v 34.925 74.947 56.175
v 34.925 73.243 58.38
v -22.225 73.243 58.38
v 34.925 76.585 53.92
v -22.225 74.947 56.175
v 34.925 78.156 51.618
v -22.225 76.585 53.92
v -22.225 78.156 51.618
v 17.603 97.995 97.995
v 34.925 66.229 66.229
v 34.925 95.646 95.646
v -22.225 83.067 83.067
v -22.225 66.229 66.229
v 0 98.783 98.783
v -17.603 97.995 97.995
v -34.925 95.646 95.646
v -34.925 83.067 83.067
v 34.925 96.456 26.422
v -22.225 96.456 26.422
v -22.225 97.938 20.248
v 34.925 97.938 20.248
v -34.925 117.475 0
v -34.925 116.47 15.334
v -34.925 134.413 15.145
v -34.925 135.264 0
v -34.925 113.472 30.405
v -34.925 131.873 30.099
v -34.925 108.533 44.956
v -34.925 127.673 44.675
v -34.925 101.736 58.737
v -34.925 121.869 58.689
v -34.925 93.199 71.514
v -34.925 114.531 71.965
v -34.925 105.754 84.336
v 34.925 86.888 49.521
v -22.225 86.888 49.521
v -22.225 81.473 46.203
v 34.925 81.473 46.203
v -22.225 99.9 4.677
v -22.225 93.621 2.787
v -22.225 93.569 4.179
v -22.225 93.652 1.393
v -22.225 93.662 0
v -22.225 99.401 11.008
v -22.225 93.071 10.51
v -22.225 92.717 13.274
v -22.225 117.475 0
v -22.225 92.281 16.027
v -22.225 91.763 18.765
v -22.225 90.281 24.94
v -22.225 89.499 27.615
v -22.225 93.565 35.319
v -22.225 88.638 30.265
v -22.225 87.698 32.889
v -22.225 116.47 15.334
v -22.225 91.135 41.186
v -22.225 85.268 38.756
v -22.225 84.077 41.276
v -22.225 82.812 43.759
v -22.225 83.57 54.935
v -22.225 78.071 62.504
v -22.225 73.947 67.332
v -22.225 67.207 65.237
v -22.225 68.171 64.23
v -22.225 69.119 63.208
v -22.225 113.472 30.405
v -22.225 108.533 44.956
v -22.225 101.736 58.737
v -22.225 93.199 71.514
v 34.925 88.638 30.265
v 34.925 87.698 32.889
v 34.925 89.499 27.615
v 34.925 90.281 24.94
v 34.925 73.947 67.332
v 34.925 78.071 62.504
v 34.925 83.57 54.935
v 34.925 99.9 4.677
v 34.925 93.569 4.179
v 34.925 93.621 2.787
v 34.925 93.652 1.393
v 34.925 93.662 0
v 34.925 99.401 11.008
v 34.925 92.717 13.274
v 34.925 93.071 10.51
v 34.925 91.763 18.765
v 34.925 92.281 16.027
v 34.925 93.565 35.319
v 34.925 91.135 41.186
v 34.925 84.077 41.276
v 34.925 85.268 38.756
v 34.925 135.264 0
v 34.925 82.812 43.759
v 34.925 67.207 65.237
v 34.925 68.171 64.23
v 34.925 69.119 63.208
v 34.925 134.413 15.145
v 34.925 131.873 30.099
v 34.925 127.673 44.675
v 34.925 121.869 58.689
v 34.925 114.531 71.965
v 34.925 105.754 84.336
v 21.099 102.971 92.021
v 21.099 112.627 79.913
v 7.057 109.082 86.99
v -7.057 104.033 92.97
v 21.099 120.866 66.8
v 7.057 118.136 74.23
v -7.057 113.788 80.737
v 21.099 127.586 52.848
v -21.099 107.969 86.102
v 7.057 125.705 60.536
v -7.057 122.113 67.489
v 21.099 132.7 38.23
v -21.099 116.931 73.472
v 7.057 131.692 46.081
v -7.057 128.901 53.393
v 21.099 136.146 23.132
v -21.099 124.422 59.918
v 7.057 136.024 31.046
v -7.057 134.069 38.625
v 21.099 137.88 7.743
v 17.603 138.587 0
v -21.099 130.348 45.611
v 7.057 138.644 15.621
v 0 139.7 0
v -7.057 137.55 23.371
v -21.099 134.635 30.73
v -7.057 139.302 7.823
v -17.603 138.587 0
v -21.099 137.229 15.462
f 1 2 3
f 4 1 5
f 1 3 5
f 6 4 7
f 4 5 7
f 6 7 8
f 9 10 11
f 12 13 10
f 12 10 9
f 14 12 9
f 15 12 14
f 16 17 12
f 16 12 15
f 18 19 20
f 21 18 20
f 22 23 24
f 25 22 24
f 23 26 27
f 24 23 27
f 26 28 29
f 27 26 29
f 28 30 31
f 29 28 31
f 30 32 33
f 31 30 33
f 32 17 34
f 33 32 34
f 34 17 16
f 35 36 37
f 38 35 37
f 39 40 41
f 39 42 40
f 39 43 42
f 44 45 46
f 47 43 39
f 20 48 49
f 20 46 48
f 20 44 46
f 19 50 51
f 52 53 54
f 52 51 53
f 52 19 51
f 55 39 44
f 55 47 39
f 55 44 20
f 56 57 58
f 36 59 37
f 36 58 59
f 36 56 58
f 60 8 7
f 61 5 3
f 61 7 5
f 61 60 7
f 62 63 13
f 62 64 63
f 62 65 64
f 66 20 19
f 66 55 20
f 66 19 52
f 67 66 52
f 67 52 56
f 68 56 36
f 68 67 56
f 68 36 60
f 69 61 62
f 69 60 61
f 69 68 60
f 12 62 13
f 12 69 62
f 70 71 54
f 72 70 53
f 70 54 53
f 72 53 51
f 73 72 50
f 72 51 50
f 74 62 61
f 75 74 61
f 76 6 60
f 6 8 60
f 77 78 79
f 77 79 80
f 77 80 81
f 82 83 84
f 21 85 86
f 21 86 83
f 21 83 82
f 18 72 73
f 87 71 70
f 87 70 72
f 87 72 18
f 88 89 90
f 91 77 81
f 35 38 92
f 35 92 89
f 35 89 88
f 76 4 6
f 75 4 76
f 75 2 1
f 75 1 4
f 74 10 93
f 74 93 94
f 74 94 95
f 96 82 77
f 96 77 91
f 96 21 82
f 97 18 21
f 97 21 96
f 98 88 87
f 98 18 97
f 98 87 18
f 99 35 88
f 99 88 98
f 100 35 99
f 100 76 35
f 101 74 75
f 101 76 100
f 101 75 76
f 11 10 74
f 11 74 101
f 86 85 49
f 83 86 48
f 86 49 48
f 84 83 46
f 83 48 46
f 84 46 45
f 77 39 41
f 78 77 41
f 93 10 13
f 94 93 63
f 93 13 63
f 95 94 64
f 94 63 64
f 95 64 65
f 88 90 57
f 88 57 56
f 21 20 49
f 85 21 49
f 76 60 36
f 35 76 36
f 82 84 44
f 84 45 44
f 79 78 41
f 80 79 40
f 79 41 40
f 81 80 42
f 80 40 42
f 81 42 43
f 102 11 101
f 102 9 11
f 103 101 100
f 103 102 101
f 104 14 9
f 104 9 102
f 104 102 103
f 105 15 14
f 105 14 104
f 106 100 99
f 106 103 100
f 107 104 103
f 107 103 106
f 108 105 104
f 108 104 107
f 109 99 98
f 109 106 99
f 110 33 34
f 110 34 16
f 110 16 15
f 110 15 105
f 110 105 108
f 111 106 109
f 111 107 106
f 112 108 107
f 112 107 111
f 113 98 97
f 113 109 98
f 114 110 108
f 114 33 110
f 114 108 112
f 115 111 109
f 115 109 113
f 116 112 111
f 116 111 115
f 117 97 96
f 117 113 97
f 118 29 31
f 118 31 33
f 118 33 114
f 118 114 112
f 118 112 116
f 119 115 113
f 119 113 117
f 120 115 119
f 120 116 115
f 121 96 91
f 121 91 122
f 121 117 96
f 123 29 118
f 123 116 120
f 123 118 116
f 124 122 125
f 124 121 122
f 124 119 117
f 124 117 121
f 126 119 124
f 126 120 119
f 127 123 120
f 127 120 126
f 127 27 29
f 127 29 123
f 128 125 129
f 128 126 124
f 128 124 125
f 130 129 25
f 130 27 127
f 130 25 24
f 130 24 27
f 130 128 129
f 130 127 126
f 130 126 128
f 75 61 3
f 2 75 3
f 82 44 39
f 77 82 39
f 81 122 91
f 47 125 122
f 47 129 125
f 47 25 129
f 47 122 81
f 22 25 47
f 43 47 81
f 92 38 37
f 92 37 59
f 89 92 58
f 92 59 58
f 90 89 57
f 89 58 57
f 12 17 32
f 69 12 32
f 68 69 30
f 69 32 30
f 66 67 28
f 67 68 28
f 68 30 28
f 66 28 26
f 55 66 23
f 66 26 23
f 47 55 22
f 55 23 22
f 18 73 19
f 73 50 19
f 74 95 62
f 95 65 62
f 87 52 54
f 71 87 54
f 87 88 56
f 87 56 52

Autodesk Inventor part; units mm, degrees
ref_plane "YZ Plane" through (0, 0, 0) normal (1, 0, 0) x (0, 1, 0)
ref_plane "XZ Plane" through (0, 0, 0) normal (0, 1, 0) x (-1, 0, 0)
sketch "Sketch1" plane through (0, 0, 0) normal (0, 0, 1) x (1, 0, 0)
  circle A0 centre (0, 0) radius 139.7
  line L0 (0, 139.7) -> (234.2216, 139.7) construction
  line L1 (-34.925, 185.7375) -> (34.925, 185.7375) construction
  line L2 (34.925, 185.7375) -> (34.925, 93.6625)
  line L3 (34.925, 93.6625) -> (-34.925, 93.6625)
  line L4 (-34.925, 93.6625) -> (-34.925, 185.7375)
  line L5 (-34.925, 185.7375) -> (34.925, 93.6625) construction
  line L6 (34.925, 185.7375) -> (-34.925, 93.6625) construction
  line L7 (0, 0) -> (253.8576, 0) construction
  point P0 (-34.925, 135.2639)
  point P1 (34.925, 135.2639)
  dimension "d6" = 279.4
  dimension "d7" = 69.85
  dimension "d8" = 92.075
  dimension "d9" = 93.6625
revolve "Revolution2" add sketch "Sketch1" angle 360 about axis through (0, 0, 0) along (1, 0, 0) picked at (2.3523, 108.9489) contours L2 L3 L4 A0
sketch "Sketch4" plane through (-34.925, 0, 0) normal (-1, 0, 0) x (0, 0, 1)
  circle A0 centre (0, 0) radius 93.6625 projected
  circle A1 centre (0, 0) radius 117.475
  dimension "d24" = 234.95
extrude "Extrusion3" cut sketch "Sketch4" against normal blind 12.7
sketch "Sketch5" plane through (34.925, 0, 0) normal (1, 0, 0) x (0, 0, -1)
  circle A0 centre (0, 0) radius 93.6625 projected
  circle A1 centre (0, 0) radius 135.2639 projected
  line L0 (0, 0) -> (0, 180.6754)
  line L1 (0, 0) -> (-127.7568, 127.7568)
  line L2 (0, 0) -> (-180.6754, 0)
  line L3 (0, 0) -> (-127.7568, -127.7568)
  line L4 (0, 0) -> (0, -180.6754)
  line L5 (0, 0) -> (127.7568, -127.7568)
  line L6 (0, 0) -> (180.6754, 0)
  line L7 (0, 0) -> (127.7568, 127.7568)
  dimension "d29" = 360
ref_plane "Work Plane1" through (34.925, 0, 0) normal (0, 0, 1) x (0, 1, 0)
pattern_circular "Circular Pattern1" count 8 over 360 about axis through (0, 0, 0) along (1, 0, 0)
split "Split1" plane through (34.925, 0, 0) removes the side toward (0, 0, -1)
split "Split2" plane through (34.925, 0, 0) removes the side toward (0, -0.7071068, 0.7071068)
sketch "Sketch6" plane through (-22.225, 0, 0) normal (-1, 0, 0) x (0, 0, 1)
  arc A0 (66.2294, 66.2294) -> (0, 93.6625) centre (0, 0) ccw projected
  line L0 (0, 0) -> (75.2096, 181.5721) construction
  line L1 (0, 0) -> (196.5323, 0) construction
  line L2 (32.8892, 87.6982) -> (38.7558, 85.2681)
  line L3 (38.7558, 85.2681) -> (41.1858, 91.1348)
  line L4 (41.1858, 91.1348) -> (35.3192, 93.5648)
  line L5 (35.3192, 93.5648) -> (32.8892, 87.6982)
  line L6 (38.2525, 92.3498) -> (35.8225, 86.4831)
  dimension "d37" = 67.5
  dimension "d46" = 6.35
  dimension "d48" = 6.35
extrude "Extrusion4" cut sketch "Sketch6" against normal up to next
pattern_circular "Circular Pattern2" count 40 over 360 about axis through (0, 0, 0) along (1, 0, 0) of "Extrusion4" geometry pattern yes
ref_plane "Work Plane2" through (34.925, 0, 0) normal (0, -0.7071068, 0.7071068) x (0, 0.7071068, 0.7071068)
ref_plane "Work Plane3" through (34.925, 0, 0) normal (0, -1, 0) x (0, 0, 1)
ref_plane "Work Plane4" through (34.925, 0, 0) normal (0, -0.7071068, -0.7071068) x (0, -0.7071068, 0.7071068)
ref_plane "Work Plane5" through (34.925, 0, 0) normal (0, 0, -1) x (0, -1, 0)
ref_plane "Work Plane6" through (34.925, 0, 0) normal (0, 0.7071068, -0.7071068) x (0, -0.7071068, -0.7071068)
ref_plane "Work Plane7" through (34.925, 0, 0) normal (0, 1, 0) x (0, 0, -1)
ref_plane "Work Plane8" through (34.925, 0, 0) normal (0, 0.7071068, 0.7071068) x (0, 0.7071068, -0.7071068)
properties part number "bigWheelWedge01" material "Wood (Maple)"
